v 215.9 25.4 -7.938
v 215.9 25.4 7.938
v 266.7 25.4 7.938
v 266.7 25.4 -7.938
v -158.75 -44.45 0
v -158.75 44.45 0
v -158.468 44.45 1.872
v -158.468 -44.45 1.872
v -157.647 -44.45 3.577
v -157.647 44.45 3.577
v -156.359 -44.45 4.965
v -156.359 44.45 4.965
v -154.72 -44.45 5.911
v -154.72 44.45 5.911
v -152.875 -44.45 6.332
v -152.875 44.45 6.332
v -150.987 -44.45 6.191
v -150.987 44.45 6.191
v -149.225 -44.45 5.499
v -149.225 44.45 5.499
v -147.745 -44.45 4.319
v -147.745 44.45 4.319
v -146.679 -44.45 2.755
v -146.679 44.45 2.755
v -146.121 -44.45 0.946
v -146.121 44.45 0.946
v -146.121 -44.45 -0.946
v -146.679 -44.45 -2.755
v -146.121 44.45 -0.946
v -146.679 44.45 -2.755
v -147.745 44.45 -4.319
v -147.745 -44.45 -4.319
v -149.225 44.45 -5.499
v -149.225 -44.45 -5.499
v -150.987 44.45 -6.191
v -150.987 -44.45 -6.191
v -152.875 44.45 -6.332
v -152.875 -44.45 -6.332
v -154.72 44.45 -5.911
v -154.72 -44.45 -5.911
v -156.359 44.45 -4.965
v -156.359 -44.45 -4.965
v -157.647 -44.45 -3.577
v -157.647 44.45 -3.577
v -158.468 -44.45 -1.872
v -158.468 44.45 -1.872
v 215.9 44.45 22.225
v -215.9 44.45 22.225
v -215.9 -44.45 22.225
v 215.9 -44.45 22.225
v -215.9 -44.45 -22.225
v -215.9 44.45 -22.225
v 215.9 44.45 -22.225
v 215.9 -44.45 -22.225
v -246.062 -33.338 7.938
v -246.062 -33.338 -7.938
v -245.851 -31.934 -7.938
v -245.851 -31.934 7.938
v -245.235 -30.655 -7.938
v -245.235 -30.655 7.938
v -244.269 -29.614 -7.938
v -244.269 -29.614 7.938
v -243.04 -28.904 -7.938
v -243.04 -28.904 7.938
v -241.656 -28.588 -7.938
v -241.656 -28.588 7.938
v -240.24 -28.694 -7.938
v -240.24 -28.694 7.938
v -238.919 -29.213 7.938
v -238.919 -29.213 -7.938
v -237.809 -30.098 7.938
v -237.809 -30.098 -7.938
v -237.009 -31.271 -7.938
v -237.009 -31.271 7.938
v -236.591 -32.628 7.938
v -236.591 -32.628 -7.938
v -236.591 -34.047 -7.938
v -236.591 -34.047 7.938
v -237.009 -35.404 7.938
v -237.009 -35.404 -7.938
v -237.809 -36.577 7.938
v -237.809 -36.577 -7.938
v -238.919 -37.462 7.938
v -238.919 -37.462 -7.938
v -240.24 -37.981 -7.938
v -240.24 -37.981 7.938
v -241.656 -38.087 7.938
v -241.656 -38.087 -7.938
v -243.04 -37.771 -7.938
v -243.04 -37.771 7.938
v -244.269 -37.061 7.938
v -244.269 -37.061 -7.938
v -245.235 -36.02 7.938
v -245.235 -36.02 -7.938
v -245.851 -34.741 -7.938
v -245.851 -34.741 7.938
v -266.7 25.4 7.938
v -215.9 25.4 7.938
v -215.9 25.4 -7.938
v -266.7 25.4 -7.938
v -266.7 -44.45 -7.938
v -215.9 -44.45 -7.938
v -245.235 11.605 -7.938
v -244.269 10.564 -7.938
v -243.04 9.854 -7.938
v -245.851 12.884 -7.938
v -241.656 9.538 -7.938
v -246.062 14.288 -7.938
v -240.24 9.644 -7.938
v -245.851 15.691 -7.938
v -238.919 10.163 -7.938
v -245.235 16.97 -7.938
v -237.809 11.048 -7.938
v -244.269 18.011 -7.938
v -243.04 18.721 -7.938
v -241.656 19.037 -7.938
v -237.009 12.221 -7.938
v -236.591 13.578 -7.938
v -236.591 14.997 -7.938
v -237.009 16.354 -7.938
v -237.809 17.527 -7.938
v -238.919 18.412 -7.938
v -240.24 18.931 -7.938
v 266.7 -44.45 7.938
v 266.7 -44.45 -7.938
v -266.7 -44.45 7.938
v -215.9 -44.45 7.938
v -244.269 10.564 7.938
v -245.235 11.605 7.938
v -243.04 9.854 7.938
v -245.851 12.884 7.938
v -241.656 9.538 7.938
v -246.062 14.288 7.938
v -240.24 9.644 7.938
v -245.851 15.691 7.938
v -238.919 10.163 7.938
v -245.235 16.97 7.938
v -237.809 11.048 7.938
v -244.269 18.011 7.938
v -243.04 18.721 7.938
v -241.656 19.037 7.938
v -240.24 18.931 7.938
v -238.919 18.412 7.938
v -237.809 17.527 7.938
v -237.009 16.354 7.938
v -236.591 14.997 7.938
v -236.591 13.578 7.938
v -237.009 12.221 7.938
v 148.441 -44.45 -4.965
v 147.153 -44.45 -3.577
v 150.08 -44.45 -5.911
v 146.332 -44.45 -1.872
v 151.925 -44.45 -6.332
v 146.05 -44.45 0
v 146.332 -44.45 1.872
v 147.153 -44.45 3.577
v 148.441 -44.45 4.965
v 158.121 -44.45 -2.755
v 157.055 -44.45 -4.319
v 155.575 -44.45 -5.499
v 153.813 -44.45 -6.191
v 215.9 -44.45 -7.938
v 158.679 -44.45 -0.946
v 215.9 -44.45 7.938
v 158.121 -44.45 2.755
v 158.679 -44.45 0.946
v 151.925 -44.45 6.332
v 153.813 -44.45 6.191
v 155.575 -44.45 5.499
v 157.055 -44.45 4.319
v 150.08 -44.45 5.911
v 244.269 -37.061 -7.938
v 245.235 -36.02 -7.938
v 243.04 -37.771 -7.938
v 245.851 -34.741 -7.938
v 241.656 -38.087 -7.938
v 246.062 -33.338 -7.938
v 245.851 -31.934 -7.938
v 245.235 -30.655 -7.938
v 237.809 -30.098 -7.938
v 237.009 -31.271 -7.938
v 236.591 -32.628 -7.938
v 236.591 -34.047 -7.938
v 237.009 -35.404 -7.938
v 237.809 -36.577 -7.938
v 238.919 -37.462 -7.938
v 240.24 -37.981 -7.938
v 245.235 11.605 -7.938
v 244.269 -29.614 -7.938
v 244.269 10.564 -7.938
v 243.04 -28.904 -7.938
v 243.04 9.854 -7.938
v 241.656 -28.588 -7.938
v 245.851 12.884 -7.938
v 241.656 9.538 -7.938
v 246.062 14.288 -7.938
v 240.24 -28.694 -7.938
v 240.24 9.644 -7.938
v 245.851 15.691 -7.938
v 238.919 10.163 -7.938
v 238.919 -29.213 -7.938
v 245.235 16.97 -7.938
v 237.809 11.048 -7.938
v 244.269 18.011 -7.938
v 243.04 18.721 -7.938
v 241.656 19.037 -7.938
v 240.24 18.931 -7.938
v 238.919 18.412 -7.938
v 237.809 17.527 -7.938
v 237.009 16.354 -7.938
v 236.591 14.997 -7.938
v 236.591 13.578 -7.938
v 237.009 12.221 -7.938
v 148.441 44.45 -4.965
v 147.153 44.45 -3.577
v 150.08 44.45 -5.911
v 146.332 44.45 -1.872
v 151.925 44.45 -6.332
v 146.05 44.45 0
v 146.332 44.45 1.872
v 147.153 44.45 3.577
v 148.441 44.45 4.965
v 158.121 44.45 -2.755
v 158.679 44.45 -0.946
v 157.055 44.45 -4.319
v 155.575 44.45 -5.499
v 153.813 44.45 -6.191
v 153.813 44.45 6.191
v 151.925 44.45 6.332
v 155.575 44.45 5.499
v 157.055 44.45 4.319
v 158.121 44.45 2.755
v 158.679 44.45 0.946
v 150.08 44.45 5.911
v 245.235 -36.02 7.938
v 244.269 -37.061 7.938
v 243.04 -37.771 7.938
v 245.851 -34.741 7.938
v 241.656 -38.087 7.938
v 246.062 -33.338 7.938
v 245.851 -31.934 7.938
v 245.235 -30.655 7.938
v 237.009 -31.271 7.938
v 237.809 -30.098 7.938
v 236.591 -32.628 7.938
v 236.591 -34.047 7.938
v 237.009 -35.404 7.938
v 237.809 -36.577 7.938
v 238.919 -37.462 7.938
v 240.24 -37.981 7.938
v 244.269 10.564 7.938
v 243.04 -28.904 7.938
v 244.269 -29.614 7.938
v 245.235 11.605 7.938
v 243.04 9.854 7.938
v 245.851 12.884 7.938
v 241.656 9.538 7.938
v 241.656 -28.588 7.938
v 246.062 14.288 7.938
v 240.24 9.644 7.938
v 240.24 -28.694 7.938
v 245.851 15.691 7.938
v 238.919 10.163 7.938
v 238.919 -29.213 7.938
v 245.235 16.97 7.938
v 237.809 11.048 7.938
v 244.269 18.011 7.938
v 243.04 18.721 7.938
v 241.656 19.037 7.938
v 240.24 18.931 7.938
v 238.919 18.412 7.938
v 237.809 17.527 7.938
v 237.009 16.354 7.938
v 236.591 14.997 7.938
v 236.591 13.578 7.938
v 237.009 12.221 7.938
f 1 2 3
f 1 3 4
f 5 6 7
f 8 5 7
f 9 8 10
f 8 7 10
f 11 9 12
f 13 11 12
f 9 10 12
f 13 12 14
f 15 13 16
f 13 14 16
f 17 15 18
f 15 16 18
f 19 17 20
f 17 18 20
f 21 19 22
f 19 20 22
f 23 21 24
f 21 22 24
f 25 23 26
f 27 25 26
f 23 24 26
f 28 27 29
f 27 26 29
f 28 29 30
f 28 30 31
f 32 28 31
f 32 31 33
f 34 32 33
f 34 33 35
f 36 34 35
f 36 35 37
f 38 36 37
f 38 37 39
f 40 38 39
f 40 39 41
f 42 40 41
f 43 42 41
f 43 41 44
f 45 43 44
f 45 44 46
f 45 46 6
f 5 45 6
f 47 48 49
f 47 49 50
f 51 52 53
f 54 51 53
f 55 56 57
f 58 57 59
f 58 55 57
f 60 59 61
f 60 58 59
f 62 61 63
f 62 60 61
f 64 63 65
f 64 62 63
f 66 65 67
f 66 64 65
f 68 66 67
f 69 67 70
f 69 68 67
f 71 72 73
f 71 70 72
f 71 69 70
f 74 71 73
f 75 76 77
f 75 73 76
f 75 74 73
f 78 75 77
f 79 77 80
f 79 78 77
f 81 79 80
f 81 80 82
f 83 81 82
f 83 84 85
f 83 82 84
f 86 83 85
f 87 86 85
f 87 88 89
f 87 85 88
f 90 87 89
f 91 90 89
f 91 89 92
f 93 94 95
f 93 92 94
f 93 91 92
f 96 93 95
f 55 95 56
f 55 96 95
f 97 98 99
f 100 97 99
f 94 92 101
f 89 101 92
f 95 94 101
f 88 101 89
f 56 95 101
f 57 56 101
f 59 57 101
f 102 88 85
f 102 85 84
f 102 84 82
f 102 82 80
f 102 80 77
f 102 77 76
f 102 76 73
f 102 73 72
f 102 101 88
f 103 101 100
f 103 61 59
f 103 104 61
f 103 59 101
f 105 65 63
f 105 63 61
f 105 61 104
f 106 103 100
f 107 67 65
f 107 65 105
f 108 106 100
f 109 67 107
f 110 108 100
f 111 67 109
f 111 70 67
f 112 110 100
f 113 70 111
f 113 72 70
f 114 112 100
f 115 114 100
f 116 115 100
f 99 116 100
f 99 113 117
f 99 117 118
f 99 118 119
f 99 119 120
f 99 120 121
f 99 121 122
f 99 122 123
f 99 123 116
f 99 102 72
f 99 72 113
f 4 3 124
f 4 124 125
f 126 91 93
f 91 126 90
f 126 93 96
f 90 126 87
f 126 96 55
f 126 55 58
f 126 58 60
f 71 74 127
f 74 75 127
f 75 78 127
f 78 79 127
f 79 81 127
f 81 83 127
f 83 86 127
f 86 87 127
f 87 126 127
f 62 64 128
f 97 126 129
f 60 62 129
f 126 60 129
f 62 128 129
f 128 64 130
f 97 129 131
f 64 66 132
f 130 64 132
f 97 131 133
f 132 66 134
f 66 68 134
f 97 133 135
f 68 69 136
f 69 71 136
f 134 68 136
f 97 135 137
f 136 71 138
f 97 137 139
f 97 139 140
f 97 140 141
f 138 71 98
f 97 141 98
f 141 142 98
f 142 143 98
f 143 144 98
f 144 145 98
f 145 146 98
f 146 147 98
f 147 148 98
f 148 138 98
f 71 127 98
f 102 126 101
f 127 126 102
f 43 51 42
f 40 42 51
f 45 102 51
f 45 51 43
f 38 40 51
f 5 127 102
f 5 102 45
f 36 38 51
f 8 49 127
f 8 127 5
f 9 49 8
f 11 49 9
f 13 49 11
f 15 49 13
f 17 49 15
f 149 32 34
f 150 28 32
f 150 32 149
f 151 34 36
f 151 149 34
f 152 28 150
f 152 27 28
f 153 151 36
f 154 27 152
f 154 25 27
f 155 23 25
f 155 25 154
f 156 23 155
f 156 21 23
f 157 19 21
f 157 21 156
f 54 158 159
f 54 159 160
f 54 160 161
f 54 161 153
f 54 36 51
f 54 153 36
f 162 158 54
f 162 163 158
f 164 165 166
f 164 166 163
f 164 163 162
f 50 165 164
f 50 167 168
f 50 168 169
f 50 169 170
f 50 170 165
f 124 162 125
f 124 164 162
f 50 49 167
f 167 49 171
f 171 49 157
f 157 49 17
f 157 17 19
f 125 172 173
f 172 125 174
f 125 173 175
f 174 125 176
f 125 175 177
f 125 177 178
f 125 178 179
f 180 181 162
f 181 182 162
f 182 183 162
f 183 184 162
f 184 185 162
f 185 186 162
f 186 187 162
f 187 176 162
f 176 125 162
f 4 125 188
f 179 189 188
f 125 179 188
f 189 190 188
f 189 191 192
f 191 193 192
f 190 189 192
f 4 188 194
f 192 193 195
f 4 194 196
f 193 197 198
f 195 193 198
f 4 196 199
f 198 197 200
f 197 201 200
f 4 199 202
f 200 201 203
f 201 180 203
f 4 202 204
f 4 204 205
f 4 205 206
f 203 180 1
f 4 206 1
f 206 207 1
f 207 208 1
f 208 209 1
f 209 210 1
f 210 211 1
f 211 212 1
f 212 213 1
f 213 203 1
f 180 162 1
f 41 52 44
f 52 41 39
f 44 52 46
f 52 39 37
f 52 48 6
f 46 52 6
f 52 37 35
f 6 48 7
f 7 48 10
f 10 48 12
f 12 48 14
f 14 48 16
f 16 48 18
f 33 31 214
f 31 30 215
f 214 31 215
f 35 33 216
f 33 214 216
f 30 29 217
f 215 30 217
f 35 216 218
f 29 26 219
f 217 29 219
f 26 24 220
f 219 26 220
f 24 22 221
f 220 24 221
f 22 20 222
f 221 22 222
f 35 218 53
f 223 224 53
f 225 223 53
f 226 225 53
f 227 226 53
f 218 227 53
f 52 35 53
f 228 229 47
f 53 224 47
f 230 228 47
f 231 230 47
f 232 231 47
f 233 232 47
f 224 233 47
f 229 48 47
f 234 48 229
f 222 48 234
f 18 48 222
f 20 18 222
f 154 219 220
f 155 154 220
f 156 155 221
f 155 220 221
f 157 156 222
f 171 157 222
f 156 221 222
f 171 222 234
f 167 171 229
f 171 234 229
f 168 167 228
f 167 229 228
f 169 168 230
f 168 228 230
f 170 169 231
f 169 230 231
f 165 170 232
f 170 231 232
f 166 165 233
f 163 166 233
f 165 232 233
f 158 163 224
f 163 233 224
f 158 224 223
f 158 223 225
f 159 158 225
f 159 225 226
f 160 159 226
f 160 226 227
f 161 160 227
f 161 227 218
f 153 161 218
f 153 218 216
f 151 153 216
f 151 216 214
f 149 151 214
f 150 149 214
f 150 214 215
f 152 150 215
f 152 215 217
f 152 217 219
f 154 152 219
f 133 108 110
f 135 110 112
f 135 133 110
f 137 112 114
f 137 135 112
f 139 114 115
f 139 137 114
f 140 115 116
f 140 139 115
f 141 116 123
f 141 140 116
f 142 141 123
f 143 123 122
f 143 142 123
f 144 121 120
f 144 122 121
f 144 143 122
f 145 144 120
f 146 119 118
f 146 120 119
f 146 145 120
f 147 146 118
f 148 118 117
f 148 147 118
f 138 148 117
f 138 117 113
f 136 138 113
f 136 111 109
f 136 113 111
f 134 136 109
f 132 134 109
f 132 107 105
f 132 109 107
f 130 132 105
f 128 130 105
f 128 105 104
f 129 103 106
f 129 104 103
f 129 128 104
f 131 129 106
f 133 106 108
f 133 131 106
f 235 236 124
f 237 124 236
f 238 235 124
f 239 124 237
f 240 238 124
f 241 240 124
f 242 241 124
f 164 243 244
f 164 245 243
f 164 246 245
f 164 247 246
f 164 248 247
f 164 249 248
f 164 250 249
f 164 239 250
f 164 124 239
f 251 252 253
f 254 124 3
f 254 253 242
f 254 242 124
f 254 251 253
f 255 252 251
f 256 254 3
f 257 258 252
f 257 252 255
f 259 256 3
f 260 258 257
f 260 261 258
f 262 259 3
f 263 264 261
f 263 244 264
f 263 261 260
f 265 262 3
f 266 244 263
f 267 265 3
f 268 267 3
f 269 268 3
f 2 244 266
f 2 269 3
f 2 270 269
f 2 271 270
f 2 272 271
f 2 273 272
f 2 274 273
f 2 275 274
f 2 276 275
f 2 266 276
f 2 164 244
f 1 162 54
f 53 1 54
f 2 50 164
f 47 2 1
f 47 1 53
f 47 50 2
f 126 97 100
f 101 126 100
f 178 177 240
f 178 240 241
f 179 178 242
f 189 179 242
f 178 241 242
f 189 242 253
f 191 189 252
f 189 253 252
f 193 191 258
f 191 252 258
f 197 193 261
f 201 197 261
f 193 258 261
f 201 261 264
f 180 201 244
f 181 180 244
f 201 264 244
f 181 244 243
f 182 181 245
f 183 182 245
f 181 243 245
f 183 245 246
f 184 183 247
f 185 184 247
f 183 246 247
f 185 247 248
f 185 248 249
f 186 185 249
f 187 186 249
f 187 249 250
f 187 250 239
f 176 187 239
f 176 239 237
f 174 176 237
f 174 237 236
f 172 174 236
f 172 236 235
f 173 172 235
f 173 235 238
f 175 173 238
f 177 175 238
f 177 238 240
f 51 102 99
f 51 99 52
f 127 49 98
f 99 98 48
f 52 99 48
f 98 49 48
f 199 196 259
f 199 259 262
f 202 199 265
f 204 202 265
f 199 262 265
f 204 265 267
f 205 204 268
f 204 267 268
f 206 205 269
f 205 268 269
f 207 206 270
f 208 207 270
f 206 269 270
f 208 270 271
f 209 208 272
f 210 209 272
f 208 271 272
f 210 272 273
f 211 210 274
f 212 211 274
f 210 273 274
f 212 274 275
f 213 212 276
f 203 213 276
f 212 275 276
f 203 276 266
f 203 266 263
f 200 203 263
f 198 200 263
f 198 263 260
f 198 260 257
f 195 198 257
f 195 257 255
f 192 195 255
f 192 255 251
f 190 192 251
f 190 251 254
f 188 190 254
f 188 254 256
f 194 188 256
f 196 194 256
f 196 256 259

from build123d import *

# Parameters (mm, degrees)
SKETCH1_W           = 431.8
SKETCH1_H           = 88.9
BOSS_EXTRUDE1_DEPTH = 22.225
SKETCH2_W           = 15.875
SKETCH2_H           = 69.85
BOSS_EXTRUDE2_DEPTH = 50.8
SKETCH3_R           = 4.7625
CUT_EXTRUDE1_DEPTH  = 273.056003253
SKETCH5_R           = 6.35
CUT_EXTRUDE3_DEPTH  = 283.003635836


with BuildPart() as part:
    # Sketch1 → Boss-Extrude1 (new, symmetric)
    with BuildSketch(Plane.XY):
        Rectangle(SKETCH1_W, SKETCH1_H)
    extrude(amount=BOSS_EXTRUDE1_DEPTH, both=True)

    # Sketch2 → Boss-Extrude2 (add)
    with BuildSketch(Plane(origin=(215.9, 0, 0), x_dir=(0, 0, -1), z_dir=(1, 0, 0))):
        with Locations((0, -9.525)):
            Rectangle(SKETCH2_W, SKETCH2_H)
    boss_extrude2 = extrude(amount=BOSS_EXTRUDE2_DEPTH)

    # Sketch3 → Cut-Extrude1 (cut, through all)
    with BuildSketch(Plane.XY.offset(7.9375)):
        with Locations((241.3, 14.2875)):
            Circle(SKETCH3_R)
        with Locations((241.3, -33.3375)):
            Circle(SKETCH3_R)
    cut_extrude1 = extrude(amount=-CUT_EXTRUDE1_DEPTH, mode=Mode.SUBTRACT)

    # Mirror1: Boss-Extrude2, Cut-Extrude1 across plane
    add(boss_extrude2.mirror(Plane(origin=(0, 0, 0), x_dir=(0, 0, 1), z_dir=(1, 0, 0))))
    add(cut_extrude1.mirror(Plane(origin=(0, 0, 0), x_dir=(0, 0, 1), z_dir=(1, 0, 0))), mode=Mode.SUBTRACT)

    # Sketch5 → Cut-Extrude3 (cut, through all)
    with BuildSketch(Plane(origin=(0, 44.45, 0), x_dir=(1, 0, 0), z_dir=(0, 1, 0))):
        with Locations(Location((-152.4, 0, 0), (0, 0, 180))):
            Circle(SKETCH5_R)
        with Locations(Location((152.4, 0, 0), (0, 0, 180))):
            Circle(SKETCH5_R)
    extrude(amount=-CUT_EXTRUDE3_DEPTH, mode=Mode.SUBTRACT)


solid = part.part
